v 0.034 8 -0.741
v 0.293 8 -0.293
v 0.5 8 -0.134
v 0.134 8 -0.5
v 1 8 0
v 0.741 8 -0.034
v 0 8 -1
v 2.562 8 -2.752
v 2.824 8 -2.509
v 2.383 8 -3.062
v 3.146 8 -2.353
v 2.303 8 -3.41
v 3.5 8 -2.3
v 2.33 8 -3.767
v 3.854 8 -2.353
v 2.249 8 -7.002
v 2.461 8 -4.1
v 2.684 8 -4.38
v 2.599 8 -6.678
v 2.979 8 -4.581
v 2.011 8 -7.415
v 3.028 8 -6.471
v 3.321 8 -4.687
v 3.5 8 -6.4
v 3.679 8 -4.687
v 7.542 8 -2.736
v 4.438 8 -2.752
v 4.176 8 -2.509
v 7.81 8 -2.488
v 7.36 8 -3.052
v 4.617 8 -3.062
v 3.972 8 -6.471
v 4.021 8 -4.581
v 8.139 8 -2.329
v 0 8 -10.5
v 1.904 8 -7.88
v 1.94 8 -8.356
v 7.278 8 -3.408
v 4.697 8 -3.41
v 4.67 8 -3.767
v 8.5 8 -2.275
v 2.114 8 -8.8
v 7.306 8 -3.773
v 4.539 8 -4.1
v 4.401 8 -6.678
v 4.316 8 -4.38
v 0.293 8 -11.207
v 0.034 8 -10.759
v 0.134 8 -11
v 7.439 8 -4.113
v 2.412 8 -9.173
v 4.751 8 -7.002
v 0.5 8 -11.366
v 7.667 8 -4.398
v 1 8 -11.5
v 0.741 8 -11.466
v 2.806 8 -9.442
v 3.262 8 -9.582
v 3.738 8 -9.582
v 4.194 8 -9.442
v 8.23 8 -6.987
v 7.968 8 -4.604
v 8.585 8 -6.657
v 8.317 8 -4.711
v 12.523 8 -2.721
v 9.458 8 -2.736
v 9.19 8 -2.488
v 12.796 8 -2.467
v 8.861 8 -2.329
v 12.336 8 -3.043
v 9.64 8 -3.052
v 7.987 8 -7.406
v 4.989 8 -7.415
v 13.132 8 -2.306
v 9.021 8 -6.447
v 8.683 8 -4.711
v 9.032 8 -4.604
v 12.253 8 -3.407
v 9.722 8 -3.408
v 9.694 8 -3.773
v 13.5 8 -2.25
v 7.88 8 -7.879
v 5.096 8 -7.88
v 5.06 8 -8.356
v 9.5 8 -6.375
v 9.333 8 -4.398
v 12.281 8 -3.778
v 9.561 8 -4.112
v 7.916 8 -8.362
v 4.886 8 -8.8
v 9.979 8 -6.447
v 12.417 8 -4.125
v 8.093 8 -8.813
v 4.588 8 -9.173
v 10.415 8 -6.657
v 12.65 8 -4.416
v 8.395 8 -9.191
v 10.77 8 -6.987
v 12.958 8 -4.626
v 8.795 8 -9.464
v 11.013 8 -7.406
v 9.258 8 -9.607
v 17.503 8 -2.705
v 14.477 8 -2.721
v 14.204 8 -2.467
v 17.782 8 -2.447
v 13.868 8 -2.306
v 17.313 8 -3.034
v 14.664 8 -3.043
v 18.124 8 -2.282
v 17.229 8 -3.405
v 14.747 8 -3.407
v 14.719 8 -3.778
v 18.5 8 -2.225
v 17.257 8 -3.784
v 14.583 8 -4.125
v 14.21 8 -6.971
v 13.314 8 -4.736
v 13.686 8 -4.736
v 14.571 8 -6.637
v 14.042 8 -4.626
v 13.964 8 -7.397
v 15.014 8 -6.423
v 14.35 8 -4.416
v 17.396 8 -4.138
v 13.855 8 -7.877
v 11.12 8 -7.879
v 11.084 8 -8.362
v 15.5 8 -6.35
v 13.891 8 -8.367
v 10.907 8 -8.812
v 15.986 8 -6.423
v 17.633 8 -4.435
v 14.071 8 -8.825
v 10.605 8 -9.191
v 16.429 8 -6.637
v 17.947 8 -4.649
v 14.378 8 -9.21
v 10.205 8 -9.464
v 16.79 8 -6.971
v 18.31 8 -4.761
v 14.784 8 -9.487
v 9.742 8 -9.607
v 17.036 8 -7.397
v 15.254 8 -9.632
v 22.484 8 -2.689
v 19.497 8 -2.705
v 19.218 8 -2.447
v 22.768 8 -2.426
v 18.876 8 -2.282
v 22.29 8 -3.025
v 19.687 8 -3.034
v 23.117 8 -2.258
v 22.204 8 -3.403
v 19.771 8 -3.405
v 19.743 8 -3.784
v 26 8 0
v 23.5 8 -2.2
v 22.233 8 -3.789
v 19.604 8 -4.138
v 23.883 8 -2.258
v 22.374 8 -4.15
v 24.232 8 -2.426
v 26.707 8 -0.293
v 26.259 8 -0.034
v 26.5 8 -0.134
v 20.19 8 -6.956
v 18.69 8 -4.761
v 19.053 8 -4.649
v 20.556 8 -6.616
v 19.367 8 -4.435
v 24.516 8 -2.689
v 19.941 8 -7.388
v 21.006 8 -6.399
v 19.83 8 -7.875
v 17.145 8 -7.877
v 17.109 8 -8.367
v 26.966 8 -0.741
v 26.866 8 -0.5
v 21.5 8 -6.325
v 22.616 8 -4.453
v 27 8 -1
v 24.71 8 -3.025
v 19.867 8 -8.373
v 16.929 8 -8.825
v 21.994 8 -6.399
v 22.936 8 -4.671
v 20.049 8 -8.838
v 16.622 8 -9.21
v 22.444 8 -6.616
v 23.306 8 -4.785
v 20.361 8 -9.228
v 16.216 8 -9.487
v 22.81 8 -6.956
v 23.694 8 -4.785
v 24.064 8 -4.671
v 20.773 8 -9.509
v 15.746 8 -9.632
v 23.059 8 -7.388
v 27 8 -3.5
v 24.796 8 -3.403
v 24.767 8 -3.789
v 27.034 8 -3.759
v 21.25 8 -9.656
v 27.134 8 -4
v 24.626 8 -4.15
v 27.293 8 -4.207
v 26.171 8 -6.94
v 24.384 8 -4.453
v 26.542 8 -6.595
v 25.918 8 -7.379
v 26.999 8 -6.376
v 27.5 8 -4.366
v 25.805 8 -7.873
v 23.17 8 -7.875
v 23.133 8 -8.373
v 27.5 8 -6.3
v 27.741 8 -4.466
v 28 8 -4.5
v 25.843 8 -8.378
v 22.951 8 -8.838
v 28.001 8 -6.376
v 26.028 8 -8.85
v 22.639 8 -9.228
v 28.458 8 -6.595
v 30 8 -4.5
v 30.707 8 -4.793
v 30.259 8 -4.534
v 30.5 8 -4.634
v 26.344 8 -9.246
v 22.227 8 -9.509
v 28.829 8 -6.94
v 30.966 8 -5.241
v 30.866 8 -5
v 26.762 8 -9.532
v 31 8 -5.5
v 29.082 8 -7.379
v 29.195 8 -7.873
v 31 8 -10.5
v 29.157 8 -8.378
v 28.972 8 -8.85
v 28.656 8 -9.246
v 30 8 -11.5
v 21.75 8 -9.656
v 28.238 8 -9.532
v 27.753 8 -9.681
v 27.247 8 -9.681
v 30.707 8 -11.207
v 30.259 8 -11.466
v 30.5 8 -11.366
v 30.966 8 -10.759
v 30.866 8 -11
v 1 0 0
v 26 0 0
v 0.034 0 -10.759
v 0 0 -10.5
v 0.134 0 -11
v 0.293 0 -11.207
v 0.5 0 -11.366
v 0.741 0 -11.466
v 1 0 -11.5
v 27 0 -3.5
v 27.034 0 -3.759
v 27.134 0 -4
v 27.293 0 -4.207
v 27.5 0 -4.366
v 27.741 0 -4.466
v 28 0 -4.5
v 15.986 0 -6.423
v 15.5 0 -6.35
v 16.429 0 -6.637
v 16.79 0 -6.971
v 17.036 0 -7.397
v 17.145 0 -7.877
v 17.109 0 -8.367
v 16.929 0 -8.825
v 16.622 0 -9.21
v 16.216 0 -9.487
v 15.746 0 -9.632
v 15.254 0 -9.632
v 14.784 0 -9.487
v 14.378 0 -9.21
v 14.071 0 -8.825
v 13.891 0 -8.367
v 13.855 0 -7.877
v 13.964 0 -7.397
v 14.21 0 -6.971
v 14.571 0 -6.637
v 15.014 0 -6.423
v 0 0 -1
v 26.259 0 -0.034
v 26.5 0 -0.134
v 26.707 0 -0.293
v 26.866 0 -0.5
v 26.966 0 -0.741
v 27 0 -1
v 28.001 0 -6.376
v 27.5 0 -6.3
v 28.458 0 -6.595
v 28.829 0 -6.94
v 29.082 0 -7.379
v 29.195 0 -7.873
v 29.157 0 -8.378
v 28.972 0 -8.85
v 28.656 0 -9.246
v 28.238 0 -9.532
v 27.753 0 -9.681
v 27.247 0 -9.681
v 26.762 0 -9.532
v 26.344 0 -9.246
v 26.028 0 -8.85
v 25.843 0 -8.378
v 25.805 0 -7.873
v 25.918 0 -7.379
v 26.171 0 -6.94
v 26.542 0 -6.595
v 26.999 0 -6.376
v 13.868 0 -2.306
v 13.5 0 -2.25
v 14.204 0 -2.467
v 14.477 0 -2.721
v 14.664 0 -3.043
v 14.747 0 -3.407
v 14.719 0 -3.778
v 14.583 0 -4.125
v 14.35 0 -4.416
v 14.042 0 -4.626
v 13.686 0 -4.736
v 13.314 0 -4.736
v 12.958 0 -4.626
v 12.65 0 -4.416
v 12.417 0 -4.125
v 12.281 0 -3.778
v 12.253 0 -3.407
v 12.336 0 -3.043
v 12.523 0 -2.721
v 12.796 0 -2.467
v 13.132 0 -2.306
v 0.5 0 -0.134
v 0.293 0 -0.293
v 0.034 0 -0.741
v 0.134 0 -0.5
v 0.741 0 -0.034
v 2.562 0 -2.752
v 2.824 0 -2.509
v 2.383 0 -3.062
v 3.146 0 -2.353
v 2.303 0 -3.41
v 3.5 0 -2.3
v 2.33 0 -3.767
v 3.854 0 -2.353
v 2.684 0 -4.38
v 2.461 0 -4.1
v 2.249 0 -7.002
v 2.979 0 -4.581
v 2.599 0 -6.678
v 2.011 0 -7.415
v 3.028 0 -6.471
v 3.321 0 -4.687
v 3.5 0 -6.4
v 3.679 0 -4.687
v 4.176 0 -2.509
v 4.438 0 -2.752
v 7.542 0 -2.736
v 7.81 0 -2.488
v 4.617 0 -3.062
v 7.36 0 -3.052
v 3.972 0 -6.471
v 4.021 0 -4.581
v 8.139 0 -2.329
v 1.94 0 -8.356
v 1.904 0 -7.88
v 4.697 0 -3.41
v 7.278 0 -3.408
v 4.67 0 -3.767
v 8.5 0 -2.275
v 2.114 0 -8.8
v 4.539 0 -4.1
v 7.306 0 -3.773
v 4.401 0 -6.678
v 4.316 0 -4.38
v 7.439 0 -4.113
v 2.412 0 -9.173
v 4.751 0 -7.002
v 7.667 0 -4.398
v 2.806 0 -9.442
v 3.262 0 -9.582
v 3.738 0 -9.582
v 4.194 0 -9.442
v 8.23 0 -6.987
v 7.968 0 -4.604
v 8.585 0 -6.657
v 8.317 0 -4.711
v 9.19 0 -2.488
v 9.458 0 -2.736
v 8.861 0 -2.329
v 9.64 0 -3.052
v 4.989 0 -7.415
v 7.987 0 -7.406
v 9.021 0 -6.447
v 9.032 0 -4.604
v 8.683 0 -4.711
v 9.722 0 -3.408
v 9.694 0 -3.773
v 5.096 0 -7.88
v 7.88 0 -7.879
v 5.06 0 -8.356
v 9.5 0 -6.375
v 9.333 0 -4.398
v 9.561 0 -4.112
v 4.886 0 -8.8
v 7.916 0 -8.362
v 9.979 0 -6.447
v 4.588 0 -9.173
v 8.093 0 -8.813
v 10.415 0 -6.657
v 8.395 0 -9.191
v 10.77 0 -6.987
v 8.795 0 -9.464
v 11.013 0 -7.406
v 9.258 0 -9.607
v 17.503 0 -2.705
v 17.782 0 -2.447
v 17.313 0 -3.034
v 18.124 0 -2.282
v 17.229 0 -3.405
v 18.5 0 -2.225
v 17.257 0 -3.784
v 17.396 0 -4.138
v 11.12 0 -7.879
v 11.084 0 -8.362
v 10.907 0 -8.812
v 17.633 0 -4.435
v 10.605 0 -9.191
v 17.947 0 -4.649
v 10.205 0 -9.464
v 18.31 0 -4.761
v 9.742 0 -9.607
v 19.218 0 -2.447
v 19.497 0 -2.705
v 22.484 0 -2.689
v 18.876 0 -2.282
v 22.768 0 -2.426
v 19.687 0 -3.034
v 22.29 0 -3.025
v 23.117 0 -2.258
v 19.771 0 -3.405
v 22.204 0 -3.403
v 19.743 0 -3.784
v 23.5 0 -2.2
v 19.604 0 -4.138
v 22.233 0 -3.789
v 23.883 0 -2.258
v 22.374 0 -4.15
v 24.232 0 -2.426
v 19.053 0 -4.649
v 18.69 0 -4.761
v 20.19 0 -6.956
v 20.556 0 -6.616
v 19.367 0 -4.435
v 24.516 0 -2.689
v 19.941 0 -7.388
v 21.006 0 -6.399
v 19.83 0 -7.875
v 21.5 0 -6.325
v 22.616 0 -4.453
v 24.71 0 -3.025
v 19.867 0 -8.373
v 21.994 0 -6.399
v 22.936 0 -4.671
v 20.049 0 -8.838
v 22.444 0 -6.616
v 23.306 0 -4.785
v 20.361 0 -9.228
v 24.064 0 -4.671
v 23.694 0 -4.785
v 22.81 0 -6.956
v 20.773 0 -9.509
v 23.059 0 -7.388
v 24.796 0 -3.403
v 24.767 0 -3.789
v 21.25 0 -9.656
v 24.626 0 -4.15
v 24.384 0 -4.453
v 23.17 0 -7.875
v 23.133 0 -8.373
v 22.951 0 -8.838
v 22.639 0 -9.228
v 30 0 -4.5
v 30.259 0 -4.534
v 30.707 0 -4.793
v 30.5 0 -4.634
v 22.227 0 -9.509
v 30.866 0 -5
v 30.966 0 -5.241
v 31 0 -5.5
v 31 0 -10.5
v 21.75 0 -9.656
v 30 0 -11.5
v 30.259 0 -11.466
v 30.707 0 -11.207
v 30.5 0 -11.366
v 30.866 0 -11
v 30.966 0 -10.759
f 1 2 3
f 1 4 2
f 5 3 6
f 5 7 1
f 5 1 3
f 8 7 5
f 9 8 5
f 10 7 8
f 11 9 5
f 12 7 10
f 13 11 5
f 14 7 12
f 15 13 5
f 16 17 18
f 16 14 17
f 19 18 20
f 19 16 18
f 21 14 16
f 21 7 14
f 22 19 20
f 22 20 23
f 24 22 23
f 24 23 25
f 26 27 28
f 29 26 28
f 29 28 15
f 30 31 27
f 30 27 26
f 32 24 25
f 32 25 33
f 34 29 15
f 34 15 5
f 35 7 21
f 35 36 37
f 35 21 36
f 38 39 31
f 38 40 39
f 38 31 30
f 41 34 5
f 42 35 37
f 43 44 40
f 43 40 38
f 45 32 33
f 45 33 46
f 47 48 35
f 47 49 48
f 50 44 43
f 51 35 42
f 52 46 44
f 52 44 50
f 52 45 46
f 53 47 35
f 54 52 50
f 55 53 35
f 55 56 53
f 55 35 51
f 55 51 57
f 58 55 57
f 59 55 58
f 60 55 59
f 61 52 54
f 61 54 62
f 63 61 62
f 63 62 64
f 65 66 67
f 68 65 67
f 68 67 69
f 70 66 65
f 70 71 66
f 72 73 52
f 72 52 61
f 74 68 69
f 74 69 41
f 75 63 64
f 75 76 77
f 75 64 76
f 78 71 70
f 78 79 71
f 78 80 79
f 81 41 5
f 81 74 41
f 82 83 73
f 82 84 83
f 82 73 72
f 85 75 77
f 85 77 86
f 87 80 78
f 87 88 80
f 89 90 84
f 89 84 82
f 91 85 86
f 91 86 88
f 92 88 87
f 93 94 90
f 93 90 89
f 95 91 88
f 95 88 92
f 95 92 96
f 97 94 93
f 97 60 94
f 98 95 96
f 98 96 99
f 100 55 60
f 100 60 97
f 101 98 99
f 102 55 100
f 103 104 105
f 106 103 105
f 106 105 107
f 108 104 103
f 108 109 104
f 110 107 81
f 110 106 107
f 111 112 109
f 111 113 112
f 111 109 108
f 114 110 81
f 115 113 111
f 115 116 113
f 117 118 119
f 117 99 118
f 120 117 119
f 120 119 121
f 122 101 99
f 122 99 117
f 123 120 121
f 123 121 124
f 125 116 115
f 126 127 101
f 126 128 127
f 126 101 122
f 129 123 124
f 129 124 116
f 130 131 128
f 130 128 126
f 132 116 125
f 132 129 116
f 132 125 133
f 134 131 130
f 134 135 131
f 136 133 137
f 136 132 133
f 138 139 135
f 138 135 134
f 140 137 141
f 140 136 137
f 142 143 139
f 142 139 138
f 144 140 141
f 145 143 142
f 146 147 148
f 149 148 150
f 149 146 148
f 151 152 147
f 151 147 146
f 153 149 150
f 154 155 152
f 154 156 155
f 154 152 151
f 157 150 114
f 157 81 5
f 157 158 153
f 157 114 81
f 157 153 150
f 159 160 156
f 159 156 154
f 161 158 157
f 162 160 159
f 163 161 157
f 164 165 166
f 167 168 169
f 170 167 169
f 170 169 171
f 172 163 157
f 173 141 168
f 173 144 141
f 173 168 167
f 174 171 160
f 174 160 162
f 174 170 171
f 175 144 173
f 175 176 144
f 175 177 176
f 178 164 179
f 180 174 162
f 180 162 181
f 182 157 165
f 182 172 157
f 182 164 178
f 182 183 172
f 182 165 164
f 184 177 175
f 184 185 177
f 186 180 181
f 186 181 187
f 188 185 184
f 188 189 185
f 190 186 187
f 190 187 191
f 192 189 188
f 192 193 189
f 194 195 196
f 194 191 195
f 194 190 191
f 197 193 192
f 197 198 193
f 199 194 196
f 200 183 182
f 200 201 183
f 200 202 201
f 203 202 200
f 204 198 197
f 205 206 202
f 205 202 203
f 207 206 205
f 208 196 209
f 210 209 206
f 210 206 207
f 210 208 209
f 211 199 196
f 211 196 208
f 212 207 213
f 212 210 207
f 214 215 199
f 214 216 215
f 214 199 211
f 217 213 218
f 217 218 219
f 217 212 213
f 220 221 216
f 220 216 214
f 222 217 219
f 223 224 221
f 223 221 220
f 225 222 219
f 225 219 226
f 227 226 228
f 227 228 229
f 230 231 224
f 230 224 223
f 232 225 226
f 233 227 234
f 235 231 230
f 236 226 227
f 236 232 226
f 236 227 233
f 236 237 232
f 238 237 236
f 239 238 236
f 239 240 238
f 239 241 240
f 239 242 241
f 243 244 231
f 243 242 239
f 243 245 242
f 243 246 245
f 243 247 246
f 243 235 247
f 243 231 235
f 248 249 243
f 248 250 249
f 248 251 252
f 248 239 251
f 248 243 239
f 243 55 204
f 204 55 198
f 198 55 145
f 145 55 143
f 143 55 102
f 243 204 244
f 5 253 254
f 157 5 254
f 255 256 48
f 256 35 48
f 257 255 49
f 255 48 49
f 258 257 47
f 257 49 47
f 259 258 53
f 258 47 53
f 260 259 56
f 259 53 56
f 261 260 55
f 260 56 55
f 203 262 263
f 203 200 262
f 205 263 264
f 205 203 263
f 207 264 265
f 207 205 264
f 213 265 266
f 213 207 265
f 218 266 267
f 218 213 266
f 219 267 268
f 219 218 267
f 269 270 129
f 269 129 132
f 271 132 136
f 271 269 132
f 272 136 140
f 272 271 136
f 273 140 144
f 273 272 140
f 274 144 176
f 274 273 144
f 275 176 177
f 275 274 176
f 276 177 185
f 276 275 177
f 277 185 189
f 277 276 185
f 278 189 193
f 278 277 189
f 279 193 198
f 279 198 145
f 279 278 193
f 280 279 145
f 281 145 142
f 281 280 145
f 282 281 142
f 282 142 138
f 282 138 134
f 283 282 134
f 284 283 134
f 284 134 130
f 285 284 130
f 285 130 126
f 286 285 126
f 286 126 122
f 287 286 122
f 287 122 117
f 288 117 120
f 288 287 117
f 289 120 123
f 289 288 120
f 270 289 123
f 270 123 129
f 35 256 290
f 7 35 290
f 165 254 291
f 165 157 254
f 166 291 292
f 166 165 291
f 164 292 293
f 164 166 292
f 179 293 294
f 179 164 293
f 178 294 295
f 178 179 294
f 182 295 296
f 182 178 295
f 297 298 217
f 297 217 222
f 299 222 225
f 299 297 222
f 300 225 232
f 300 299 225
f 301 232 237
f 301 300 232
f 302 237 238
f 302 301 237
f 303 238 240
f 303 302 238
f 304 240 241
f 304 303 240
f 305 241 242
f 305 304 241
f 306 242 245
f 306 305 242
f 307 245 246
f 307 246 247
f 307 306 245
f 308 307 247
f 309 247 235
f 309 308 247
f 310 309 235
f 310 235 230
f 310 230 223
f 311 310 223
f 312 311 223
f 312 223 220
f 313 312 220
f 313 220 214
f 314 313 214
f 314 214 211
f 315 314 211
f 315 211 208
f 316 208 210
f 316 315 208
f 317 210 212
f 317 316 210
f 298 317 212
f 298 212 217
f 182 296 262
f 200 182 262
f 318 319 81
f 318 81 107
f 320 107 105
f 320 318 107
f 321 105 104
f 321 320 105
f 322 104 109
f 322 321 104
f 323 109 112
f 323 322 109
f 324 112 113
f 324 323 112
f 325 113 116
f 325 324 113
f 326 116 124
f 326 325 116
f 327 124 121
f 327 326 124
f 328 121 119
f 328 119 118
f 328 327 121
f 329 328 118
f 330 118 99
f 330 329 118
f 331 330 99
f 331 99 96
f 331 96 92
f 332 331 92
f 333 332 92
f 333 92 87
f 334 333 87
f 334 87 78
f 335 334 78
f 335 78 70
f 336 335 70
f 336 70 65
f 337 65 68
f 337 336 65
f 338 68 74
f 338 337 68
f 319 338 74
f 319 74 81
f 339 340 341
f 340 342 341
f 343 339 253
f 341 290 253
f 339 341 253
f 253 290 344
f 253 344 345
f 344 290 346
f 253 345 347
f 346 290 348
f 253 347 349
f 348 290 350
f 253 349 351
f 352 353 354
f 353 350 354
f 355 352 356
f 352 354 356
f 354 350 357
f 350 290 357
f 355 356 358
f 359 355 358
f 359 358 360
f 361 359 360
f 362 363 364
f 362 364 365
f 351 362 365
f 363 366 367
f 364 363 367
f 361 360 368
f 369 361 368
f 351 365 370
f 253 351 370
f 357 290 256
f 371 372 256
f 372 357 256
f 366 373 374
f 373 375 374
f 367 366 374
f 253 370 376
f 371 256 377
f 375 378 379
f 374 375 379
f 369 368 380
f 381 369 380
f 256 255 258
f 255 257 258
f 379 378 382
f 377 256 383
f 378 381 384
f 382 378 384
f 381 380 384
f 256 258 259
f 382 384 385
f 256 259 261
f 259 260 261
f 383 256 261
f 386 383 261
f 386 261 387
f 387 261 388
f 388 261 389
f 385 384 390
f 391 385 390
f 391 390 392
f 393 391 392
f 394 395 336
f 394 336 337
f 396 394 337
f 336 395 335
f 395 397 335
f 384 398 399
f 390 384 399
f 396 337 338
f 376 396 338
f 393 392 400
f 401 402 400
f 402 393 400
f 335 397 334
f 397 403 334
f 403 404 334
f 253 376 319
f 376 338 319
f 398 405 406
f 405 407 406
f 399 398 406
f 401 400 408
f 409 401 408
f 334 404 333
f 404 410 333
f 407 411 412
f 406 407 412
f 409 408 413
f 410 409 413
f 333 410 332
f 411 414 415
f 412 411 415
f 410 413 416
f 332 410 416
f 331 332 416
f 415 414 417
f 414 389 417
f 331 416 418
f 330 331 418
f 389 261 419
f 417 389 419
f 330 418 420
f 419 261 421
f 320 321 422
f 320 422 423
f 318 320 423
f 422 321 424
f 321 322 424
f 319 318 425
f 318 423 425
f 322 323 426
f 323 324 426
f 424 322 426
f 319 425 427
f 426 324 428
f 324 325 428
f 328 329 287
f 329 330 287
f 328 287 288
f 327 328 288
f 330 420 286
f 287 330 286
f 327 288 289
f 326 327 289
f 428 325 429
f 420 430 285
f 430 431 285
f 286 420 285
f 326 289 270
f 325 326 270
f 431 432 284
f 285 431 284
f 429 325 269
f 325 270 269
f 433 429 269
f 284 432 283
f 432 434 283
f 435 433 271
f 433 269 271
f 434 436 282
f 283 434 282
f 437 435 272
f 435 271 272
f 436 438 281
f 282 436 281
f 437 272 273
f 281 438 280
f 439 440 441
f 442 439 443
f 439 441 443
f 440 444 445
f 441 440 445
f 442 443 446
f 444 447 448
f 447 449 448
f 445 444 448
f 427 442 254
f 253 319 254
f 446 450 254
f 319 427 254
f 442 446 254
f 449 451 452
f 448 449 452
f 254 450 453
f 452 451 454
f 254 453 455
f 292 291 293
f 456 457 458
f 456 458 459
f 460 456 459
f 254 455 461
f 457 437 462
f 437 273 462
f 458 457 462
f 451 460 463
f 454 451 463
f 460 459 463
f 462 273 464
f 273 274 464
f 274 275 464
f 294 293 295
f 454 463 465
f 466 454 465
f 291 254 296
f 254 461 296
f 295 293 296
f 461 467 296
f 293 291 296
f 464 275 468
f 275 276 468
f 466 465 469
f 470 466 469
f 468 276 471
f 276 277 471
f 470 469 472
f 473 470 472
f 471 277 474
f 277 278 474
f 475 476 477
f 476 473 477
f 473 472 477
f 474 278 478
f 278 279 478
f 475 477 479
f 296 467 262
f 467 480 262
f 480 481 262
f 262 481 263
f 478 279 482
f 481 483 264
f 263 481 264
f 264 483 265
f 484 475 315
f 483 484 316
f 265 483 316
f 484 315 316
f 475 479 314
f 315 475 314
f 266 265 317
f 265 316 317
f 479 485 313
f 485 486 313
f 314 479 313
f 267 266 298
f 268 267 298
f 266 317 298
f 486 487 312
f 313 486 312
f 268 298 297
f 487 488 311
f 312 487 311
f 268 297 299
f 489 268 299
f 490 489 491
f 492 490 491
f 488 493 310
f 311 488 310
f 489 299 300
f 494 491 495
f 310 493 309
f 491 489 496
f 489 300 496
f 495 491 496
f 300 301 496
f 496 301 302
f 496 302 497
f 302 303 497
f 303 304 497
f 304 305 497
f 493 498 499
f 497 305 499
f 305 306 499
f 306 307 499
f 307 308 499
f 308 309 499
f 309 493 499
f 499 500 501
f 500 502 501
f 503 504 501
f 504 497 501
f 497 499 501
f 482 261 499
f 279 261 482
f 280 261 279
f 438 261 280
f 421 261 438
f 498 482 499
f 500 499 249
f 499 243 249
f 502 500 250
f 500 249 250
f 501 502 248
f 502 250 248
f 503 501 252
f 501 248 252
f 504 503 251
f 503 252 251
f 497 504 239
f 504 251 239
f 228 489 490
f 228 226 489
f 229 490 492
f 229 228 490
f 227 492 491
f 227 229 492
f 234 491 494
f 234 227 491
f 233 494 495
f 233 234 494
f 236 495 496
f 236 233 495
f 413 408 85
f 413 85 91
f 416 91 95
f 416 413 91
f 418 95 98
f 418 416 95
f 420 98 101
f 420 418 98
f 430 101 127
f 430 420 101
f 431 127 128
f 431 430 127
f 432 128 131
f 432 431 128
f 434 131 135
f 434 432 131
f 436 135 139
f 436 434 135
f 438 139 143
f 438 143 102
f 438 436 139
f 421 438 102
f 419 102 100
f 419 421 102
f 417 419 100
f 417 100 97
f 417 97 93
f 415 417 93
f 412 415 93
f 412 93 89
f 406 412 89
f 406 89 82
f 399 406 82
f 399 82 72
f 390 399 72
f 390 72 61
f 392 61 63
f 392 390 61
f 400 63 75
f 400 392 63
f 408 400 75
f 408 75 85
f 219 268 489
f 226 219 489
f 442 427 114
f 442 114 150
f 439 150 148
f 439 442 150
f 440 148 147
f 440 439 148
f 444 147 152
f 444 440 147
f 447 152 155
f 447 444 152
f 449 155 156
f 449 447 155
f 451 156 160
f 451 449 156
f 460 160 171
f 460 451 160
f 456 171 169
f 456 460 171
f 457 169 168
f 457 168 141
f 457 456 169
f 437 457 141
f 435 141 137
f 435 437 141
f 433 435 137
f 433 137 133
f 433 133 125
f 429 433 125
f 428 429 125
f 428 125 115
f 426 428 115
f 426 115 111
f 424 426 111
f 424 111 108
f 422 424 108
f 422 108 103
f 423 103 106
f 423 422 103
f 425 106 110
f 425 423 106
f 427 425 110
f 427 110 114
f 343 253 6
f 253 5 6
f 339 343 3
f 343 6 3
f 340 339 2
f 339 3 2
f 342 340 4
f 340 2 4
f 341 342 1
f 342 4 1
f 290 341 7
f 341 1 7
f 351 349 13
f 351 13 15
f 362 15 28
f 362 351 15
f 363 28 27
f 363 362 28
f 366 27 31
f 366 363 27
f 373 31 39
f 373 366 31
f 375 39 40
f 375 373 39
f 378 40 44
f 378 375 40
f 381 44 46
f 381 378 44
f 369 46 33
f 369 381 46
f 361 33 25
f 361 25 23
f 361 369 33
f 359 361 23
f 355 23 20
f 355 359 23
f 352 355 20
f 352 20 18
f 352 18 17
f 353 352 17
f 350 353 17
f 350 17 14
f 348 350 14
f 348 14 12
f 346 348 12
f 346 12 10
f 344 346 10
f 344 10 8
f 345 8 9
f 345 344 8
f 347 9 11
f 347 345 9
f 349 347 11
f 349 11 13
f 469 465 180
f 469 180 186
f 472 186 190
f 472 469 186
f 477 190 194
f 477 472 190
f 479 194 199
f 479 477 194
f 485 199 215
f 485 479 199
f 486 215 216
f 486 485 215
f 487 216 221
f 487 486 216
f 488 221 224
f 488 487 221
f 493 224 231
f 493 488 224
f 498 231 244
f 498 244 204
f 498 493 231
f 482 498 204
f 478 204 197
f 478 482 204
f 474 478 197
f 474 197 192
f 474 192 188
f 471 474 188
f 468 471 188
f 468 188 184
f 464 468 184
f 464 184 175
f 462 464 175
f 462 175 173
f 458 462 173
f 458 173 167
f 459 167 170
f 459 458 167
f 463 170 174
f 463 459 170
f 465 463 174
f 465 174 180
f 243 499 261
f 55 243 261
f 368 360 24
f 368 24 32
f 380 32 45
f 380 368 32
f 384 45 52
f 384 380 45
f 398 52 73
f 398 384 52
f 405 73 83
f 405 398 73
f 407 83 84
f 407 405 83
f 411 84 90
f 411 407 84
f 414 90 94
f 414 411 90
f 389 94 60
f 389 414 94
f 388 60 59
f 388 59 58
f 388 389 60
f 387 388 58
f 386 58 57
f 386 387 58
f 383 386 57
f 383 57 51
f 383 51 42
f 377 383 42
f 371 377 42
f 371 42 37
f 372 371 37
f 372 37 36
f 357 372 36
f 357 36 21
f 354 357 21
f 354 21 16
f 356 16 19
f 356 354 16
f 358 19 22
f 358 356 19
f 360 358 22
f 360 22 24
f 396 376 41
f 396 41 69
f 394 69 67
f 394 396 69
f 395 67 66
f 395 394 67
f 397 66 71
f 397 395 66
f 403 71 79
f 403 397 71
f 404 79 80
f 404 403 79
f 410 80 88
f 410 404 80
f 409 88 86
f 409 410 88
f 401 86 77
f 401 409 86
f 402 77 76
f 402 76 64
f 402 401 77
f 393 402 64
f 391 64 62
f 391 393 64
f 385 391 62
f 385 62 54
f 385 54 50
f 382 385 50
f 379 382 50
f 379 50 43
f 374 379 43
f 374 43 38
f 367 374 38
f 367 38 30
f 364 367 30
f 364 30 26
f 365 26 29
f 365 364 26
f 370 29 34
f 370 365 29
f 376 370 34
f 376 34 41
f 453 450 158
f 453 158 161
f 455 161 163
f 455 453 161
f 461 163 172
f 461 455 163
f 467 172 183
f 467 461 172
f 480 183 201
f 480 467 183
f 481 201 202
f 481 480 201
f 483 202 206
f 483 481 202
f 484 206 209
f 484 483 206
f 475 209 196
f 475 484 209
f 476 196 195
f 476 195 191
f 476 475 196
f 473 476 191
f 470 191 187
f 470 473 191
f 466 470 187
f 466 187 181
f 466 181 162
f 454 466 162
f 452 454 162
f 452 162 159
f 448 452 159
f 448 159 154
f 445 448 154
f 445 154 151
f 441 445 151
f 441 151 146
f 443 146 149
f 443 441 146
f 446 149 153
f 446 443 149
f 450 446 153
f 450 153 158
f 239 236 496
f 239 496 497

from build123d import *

# Parameters (mm, degrees)
SKETCH1_R           = 1.2
SKETCH1_R_2         = 1.225
SKETCH1_R_3         = 1.25
SKETCH1_R_4         = 1.275
SKETCH1_R_5         = 1.3
SKETCH1_R_6         = 1.6
SKETCH1_R_7         = 1.625
SKETCH1_R_8         = 1.65
SKETCH1_R_9         = 1.675
SKETCH1_R_10        = 1.7
BOSS_EXTRUDE1_DEPTH = 8
FILLET1_R           = 1


with BuildPart() as part:
    # Sketch1 → Boss-Extrude1 (new body)
    with BuildSketch(Plane(origin=(0, 0, 0), x_dir=(1, 0, 0), z_dir=(0, 1, 0))):
        Polygon((0, 0), (27, 0), (27, 4.5), (31, 4.5), (31, 11.5), (0, 11.5), align=None)
        with Locations(Location((3.5, 3.5, 0), (0, 0, 270))):
            Circle(SKETCH1_R, mode=Mode.SUBTRACT)
        with Locations(Location((8.5, 3.5, 0), (0, 0, 270))):
            Circle(SKETCH1_R_2, mode=Mode.SUBTRACT)
        with Locations(Location((13.5, 3.5, 0), (0, 0, 270))):
            Circle(SKETCH1_R_3, mode=Mode.SUBTRACT)
        with Locations(Location((18.5, 3.5, 0), (0, 0, 270))):
            Circle(SKETCH1_R_4, mode=Mode.SUBTRACT)
        with Locations(Location((23.5, 3.5, 0), (0, 0, 270))):
            Circle(SKETCH1_R_5, mode=Mode.SUBTRACT)
        with Locations(Location((3.5, 8, 0), (0, 0, 270))):
            Circle(SKETCH1_R_6, mode=Mode.SUBTRACT)
        with Locations(Location((9.5, 8, 0), (0, 0, 270))):
            Circle(SKETCH1_R_7, mode=Mode.SUBTRACT)
        with Locations(Location((15.5, 8, 0), (0, 0, 270))):
            Circle(SKETCH1_R_8, mode=Mode.SUBTRACT)
        with Locations(Location((21.5, 8, 0), (0, 0, 270))):
            Circle(SKETCH1_R_9, mode=Mode.SUBTRACT)
        with Locations(Location((27.5, 8, 0), (0, 0, 270))):
            Circle(SKETCH1_R_10, mode=Mode.SUBTRACT)
    extrude(amount=BOSS_EXTRUDE1_DEPTH)

    # Fillet1
    fillet1_edges = [part.edges().sort_by_distance(p)[0] for p in [
        (0, 4, -11.5),
        (31, 4, -11.5),
        (31, 4, -4.5),
        (27, 4, -4.5),
        (27, 4, 0),
        (0, 4, 0),
    ]]
    fillet(fillet1_edges, radius=FILLET1_R)


solid = part.part
